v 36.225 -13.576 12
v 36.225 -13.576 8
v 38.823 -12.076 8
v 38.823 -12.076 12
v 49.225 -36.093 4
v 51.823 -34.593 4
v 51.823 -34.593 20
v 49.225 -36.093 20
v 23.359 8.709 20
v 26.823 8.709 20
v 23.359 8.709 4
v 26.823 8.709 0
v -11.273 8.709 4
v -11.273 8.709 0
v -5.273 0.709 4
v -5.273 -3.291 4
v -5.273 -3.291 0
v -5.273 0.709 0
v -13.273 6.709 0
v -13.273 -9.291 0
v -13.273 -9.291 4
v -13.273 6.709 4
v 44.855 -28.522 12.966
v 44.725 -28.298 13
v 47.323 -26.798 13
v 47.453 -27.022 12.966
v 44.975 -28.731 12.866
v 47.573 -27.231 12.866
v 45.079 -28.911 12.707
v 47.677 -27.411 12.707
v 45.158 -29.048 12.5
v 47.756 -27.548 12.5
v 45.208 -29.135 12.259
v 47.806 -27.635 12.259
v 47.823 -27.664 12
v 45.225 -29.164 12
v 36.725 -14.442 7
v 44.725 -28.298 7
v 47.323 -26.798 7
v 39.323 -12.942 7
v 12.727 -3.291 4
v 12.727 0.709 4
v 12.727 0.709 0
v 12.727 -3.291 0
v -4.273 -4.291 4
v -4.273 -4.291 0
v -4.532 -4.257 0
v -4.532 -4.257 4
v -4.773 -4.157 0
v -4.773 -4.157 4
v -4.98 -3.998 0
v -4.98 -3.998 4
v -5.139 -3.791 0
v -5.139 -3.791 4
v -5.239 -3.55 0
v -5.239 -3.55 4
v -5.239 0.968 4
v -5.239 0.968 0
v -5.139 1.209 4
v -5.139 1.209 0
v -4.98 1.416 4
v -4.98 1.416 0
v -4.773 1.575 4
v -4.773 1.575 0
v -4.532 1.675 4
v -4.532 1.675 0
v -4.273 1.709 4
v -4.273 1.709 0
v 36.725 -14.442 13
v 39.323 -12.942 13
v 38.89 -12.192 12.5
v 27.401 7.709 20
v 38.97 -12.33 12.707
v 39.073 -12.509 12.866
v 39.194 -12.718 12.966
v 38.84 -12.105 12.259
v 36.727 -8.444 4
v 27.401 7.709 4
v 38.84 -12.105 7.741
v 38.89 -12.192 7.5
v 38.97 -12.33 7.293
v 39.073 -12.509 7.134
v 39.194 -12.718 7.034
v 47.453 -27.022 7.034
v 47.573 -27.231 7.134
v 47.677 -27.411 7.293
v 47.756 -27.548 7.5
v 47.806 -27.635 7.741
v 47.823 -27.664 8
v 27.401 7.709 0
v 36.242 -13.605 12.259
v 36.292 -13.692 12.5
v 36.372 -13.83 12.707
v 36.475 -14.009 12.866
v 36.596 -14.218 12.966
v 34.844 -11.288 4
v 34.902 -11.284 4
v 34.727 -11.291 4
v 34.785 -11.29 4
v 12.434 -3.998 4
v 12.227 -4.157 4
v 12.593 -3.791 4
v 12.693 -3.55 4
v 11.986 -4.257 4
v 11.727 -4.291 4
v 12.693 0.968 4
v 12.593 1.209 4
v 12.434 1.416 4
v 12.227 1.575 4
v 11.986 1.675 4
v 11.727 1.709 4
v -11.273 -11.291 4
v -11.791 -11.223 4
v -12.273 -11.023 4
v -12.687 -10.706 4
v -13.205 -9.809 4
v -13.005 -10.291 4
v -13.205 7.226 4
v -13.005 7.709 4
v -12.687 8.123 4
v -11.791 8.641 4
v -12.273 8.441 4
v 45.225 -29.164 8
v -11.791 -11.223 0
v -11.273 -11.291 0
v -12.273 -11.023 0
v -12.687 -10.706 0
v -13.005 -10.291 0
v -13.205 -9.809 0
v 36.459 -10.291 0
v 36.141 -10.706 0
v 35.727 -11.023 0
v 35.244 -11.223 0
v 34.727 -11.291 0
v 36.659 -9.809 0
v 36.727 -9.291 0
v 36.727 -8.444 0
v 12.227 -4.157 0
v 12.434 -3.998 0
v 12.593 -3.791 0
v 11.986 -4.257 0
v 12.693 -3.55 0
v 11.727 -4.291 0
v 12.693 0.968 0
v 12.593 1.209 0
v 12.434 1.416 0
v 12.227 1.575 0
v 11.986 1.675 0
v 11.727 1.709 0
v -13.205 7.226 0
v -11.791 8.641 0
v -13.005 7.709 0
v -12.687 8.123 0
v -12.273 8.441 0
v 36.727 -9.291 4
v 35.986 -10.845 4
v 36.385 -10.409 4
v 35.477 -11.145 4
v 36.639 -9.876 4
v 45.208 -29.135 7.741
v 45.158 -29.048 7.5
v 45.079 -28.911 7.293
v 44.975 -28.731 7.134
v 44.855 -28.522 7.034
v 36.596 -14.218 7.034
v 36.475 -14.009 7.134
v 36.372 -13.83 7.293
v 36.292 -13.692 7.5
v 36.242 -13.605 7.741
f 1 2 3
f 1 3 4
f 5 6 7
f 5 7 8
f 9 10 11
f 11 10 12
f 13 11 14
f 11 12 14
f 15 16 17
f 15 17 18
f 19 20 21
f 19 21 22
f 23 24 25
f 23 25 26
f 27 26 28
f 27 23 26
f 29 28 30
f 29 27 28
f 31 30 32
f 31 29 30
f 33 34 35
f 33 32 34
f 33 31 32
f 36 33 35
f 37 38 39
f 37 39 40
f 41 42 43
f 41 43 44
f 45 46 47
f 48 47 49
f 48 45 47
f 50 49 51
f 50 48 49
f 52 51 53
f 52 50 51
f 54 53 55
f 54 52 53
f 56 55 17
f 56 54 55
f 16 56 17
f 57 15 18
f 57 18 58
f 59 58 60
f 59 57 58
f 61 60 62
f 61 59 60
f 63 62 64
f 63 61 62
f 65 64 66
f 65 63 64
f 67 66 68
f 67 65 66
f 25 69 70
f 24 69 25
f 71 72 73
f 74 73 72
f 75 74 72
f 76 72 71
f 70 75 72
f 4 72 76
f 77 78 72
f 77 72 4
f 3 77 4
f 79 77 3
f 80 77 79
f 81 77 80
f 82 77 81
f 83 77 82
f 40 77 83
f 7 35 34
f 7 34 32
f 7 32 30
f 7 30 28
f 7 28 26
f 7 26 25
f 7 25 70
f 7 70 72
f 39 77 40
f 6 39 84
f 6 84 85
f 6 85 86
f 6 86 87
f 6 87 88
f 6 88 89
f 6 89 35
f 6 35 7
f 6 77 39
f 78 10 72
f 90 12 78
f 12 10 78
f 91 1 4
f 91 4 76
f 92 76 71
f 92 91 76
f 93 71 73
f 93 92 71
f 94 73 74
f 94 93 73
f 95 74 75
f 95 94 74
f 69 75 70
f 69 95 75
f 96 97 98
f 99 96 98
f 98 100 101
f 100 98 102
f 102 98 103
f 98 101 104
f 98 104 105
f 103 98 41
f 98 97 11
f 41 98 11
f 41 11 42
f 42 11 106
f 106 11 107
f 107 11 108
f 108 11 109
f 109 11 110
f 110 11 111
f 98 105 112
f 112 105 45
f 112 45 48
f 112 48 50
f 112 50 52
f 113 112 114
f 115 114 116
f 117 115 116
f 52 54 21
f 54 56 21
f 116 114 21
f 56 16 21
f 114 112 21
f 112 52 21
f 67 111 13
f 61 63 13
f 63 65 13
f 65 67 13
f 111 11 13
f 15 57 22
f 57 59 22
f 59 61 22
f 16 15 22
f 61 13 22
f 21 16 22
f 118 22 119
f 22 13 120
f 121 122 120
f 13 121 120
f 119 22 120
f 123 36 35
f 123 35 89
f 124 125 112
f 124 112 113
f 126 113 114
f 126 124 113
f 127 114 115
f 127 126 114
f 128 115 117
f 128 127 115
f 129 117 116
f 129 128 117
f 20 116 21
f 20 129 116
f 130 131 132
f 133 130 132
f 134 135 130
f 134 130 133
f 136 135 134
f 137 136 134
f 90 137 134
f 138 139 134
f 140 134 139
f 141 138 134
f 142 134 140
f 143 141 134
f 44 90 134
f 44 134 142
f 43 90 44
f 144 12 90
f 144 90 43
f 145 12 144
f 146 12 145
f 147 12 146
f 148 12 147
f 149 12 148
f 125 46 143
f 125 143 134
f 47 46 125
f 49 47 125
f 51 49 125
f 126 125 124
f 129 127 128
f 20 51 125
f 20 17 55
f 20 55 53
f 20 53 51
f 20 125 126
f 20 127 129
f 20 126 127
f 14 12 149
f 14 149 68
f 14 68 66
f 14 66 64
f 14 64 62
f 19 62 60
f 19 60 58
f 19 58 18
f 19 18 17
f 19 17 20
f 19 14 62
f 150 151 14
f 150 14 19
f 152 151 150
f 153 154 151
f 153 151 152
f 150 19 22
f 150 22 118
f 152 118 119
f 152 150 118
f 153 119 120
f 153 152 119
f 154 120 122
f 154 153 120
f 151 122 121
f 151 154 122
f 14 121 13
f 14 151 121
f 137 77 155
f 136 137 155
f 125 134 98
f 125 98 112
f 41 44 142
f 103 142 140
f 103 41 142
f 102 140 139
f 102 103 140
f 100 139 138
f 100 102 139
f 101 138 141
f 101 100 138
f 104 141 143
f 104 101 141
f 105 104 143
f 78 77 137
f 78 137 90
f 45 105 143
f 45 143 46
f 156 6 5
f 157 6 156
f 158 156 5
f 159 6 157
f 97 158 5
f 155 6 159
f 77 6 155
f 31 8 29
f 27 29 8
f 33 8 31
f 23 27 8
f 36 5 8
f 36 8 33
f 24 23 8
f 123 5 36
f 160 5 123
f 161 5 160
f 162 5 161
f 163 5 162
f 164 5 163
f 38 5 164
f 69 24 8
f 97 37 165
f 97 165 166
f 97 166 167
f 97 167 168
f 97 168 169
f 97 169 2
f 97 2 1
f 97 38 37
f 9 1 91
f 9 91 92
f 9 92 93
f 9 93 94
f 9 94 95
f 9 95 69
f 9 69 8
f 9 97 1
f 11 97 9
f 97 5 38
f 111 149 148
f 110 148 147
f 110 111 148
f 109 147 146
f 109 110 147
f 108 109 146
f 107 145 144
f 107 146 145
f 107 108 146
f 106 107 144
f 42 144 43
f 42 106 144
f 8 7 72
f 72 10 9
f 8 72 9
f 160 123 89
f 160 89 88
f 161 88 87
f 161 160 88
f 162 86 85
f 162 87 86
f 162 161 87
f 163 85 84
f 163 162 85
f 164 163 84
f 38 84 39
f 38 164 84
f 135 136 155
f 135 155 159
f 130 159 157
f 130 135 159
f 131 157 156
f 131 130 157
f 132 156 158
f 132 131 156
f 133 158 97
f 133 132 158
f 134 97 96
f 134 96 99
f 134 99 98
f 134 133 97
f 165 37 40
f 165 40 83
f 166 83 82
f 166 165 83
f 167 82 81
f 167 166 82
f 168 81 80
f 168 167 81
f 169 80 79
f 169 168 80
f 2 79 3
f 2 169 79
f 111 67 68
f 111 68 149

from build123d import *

# Parameters (mm, degrees)
BOSS_EXTRU_1_DEPTH      = 4
ENL_V_MAT_EXTRU_1_DEPTH = 50
BOSS_EXTRU_2_DEPTH      = 16
ENL_V_MAT_EXTRU_2_REACH = 64.735
ENL_V_MAT_EXTRU_4_DEPTH = 66.148525236


with BuildPart() as part:
    # Esquisse1 → Boss.-Extru.1 (new body)
    with BuildSketch(Plane.XY):
        with BuildLine():
            Line((-11.273273273, 8.708708709), (34.726726727, 8.708708709))
            ThreePointArc((34.726726727, 8.708708709), (36.140940289, 8.122922271), (36.726726727, 6.708708709))
            Line((36.726726727, 6.708708709), (36.726726727, -9.291291291))
            ThreePointArc((36.726726727, -9.291291291), (36.140940289, -10.705504854), (34.726726727, -11.291291291))
            Line((34.726726727, -11.291291291), (-11.273273273, -11.291291291))
            ThreePointArc((-11.273273273, -11.291291291), (-12.687486836, -10.705504854), (-13.273273273, -9.291291291))
            Line((-13.273273273, -9.291291291), (-13.273273273, 6.708708709))
            ThreePointArc((-13.273273273, 6.708708709), (-12.687486836, 8.122922271), (-11.273273273, 8.708708709))
        make_face()
    extrude(amount=BOSS_EXTRU_1_DEPTH)

    # Esquisse3 → Enlèv. mat.-Extru.1 (cut)
    with BuildSketch(Plane.XY.offset(4)):
        with BuildLine():
            Line((-4.273273273, 1.708708709), (11.726726727, 1.708708709))
            ThreePointArc((11.726726727, 1.708708709), (12.433833508, 1.41581549), (12.726726727, 0.708708709))
            Line((12.726726727, 0.708708709), (12.726726727, -3.291291291))
            ThreePointArc((12.726726727, -3.291291291), (12.433833508, -3.998398072), (11.726726727, -4.291291291))
            Line((11.726726727, -4.291291291), (-4.273273273, -4.291291291))
            ThreePointArc((-4.273273273, -4.291291291), (-4.980380054, -3.998398072), (-5.273273273, -3.291291291))
            Line((-5.273273273, -3.291291291), (-5.273273273, 0.708708709))
            ThreePointArc((-5.273273273, 0.708708709), (-4.980380054, 1.41581549), (-4.273273273, 1.708708709))
        make_face()
    extrude(amount=-ENL_V_MAT_EXTRU_1_DEPTH, mode=Mode.SUBTRACT)

    # Esquisse4 → Boss.-Extru.2 (add)
    with BuildSketch(Plane.XY.offset(4)):
        Polygon((27.400678474, 7.708708709), (51.823328204, -34.592561481), (49.225251993, -36.092561481), (23.359226589, 8.708708709), (25.668627666, 8.708708709), (26.823328204, 8.708708709), align=None)
    extrude(amount=BOSS_EXTRU_2_DEPTH)

    # Esquisse6 → Enlèv. mat.-Extru.2 (cut, up to next)
    with BuildSketch(Plane(origin=(21.29040143, 12.292018997, 0), x_dir=(0, 0, 1), z_dir=(-0.8660254037844363, -0.5000000000000042, 0)), mode=Mode.PRIVATE) as enl_v_mat_extru_2_sk1:
        with BuildLine():
            Line((8, -29.869701126), (12, -29.869701126))
            ThreePointArc((12, -29.869701126), (12.707106781, -30.162594345), (13, -30.869701126))
            Line((13, -30.869701126), (13, -46.869701126))
            ThreePointArc((13, -46.869701126), (12.707106781, -47.576807907), (12, -47.869701126))
            Line((12, -47.869701126), (8, -47.869701126))
            ThreePointArc((8, -47.869701126), (7.292893219, -47.576807907), (7, -46.869701126))
            Line((7, -46.869701126), (7, -30.869701126))
            ThreePointArc((7, -30.869701126), (7.292893219, -30.162594345), (8, -29.869701126))
        make_face()
    enl_v_mat_extru_2_tool1 = extrude(enl_v_mat_extru_2_sk1.sketch, amount=-ENL_V_MAT_EXTRU_2_REACH, mode=Mode.PRIVATE) & part.part
    add(enl_v_mat_extru_2_tool1.solids().sort_by_distance((40.725252, -21.37013, 10))[0], mode=Mode.SUBTRACT)

    # Esquisse11 → Enlèv. mat.-Extru.4 (cut, through all)
    with BuildSketch(Plane.XY.offset(4)):
        with BuildLine():
            Line((36.749431367, 6.794564493), (36.991578009, -8.903216578))
            Line((36.991578009, -8.903216578), (27.400678474, 7.708708709))
            Line((27.400678474, 7.708708709), (26.823328204, 8.708708709))
            Line((26.823328204, 8.708708709), (34.726726727, 8.708708709))
            ThreePointArc((34.726726727, 8.708708709), (36.561329958, 8.621578074), (36.749431367, 6.794564493))
        make_face()
    extrude(amount=-ENL_V_MAT_EXTRU_4_DEPTH, mode=Mode.SUBTRACT)


solid = part.part
